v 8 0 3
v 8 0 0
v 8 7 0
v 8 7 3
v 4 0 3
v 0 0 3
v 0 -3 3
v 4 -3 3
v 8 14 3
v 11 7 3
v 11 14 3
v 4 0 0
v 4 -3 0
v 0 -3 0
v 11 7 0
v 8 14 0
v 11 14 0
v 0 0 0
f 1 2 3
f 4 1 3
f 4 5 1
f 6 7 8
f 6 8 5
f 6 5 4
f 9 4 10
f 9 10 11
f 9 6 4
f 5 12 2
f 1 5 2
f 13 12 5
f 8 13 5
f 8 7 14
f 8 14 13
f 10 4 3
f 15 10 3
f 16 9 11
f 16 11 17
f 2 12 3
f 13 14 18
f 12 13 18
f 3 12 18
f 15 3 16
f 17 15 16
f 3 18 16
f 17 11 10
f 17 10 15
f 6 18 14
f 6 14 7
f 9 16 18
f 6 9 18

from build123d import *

# Parameters (mm, degrees)
EXTRUDE_1_DEPTH = 3
SKETCH_2_W      = 4
SKETCH_2_H      = 3
EXTRUDE_2_DEPTH = 3
SKETCH_3_W      = 3
SKETCH_3_H      = 7
EXTRUDE_3_DEPTH = 3


with BuildPart() as part:
    # 草图1 → 凸台-拉伸1 (new body)
    with BuildSketch(Plane.XY):
        Polygon((0, 0), (8, 0), (8, 14), align=None)
    extrude(amount=EXTRUDE_1_DEPTH)

    # 草图2 → 凸台-拉伸2 (add)
    with BuildSketch(Plane.XZ):
        with Locations((2, 1.5)):
            Rectangle(SKETCH_2_W, SKETCH_2_H)
    extrude(amount=EXTRUDE_2_DEPTH)

    # 草图3 → 凸台-拉伸3 (add)
    with BuildSketch(Plane(origin=(8, 0, 0), x_dir=(0, 0, -1), z_dir=(1, 0, 0))):
        with Locations((-1.5, 10.5)):
            Rectangle(SKETCH_3_W, SKETCH_3_H)
    extrude(amount=EXTRUDE_3_DEPTH)


solid = part.part
